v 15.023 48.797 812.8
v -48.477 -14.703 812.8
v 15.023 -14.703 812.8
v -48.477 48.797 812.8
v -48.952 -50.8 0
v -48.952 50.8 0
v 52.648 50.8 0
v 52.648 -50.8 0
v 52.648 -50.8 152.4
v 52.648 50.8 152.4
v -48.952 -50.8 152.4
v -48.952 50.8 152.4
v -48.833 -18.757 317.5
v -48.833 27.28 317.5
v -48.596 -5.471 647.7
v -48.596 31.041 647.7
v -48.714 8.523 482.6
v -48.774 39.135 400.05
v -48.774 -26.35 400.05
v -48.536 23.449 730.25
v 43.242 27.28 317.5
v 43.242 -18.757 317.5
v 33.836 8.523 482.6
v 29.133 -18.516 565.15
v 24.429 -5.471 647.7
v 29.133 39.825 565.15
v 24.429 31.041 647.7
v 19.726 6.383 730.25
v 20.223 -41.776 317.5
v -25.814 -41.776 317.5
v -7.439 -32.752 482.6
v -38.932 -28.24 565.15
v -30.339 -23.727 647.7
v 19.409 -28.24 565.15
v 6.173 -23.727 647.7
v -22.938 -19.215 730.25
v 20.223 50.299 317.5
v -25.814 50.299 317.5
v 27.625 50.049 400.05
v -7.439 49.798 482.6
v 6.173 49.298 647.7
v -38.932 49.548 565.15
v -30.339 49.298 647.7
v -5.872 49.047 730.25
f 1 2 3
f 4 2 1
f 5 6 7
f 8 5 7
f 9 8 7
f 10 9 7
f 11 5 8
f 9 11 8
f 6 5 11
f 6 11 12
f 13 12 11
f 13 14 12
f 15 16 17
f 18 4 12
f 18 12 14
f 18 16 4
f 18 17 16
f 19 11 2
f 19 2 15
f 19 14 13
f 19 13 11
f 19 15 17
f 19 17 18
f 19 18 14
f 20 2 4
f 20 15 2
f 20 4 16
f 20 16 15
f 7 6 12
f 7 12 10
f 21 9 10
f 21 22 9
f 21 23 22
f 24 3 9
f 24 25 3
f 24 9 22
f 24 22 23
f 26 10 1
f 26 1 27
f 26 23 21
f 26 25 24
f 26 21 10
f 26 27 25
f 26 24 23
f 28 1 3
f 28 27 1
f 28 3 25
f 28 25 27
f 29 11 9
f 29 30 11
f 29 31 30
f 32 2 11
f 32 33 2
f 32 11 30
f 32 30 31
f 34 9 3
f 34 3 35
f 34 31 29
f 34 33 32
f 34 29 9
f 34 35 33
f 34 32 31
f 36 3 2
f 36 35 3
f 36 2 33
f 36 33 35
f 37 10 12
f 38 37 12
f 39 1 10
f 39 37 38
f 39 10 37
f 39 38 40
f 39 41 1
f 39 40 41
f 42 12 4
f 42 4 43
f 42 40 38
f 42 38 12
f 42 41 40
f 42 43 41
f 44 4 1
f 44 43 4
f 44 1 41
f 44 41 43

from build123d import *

# Parameters (mm, degrees)
F0_W      = 101.6
F0_H      = 101.6
F1_DEPTH  = 152.4
F1_FACE_W = 101.6
F1_FACE_H = 101.6
F3_W      = 63.5
F3_H      = 63.5


with BuildPart() as f1:
    # F0 (on Top) → F1 (new body)
    with BuildSketch(Plane.XY):
        with Locations((1.8484146567, 0)):
            Rectangle(F0_W, F0_H)
    extrude(amount=F1_DEPTH)

    # F1_face (on face) → F4 section 0
    with BuildSketch(Plane(origin=(1.8484146567, 0, 152.4), x_dir=(1, 0, 0), z_dir=(0, 0, 1))):
        Rectangle(F1_FACE_W, F1_FACE_H)
    # F3 (on offset) → F4 section 1
    with BuildSketch(Plane.XY.offset(812.8)):
        with Locations((-16.7269780412, 17.0467783809)):
            Rectangle(F3_W, F3_H)
    loft()


solid = f1.part
